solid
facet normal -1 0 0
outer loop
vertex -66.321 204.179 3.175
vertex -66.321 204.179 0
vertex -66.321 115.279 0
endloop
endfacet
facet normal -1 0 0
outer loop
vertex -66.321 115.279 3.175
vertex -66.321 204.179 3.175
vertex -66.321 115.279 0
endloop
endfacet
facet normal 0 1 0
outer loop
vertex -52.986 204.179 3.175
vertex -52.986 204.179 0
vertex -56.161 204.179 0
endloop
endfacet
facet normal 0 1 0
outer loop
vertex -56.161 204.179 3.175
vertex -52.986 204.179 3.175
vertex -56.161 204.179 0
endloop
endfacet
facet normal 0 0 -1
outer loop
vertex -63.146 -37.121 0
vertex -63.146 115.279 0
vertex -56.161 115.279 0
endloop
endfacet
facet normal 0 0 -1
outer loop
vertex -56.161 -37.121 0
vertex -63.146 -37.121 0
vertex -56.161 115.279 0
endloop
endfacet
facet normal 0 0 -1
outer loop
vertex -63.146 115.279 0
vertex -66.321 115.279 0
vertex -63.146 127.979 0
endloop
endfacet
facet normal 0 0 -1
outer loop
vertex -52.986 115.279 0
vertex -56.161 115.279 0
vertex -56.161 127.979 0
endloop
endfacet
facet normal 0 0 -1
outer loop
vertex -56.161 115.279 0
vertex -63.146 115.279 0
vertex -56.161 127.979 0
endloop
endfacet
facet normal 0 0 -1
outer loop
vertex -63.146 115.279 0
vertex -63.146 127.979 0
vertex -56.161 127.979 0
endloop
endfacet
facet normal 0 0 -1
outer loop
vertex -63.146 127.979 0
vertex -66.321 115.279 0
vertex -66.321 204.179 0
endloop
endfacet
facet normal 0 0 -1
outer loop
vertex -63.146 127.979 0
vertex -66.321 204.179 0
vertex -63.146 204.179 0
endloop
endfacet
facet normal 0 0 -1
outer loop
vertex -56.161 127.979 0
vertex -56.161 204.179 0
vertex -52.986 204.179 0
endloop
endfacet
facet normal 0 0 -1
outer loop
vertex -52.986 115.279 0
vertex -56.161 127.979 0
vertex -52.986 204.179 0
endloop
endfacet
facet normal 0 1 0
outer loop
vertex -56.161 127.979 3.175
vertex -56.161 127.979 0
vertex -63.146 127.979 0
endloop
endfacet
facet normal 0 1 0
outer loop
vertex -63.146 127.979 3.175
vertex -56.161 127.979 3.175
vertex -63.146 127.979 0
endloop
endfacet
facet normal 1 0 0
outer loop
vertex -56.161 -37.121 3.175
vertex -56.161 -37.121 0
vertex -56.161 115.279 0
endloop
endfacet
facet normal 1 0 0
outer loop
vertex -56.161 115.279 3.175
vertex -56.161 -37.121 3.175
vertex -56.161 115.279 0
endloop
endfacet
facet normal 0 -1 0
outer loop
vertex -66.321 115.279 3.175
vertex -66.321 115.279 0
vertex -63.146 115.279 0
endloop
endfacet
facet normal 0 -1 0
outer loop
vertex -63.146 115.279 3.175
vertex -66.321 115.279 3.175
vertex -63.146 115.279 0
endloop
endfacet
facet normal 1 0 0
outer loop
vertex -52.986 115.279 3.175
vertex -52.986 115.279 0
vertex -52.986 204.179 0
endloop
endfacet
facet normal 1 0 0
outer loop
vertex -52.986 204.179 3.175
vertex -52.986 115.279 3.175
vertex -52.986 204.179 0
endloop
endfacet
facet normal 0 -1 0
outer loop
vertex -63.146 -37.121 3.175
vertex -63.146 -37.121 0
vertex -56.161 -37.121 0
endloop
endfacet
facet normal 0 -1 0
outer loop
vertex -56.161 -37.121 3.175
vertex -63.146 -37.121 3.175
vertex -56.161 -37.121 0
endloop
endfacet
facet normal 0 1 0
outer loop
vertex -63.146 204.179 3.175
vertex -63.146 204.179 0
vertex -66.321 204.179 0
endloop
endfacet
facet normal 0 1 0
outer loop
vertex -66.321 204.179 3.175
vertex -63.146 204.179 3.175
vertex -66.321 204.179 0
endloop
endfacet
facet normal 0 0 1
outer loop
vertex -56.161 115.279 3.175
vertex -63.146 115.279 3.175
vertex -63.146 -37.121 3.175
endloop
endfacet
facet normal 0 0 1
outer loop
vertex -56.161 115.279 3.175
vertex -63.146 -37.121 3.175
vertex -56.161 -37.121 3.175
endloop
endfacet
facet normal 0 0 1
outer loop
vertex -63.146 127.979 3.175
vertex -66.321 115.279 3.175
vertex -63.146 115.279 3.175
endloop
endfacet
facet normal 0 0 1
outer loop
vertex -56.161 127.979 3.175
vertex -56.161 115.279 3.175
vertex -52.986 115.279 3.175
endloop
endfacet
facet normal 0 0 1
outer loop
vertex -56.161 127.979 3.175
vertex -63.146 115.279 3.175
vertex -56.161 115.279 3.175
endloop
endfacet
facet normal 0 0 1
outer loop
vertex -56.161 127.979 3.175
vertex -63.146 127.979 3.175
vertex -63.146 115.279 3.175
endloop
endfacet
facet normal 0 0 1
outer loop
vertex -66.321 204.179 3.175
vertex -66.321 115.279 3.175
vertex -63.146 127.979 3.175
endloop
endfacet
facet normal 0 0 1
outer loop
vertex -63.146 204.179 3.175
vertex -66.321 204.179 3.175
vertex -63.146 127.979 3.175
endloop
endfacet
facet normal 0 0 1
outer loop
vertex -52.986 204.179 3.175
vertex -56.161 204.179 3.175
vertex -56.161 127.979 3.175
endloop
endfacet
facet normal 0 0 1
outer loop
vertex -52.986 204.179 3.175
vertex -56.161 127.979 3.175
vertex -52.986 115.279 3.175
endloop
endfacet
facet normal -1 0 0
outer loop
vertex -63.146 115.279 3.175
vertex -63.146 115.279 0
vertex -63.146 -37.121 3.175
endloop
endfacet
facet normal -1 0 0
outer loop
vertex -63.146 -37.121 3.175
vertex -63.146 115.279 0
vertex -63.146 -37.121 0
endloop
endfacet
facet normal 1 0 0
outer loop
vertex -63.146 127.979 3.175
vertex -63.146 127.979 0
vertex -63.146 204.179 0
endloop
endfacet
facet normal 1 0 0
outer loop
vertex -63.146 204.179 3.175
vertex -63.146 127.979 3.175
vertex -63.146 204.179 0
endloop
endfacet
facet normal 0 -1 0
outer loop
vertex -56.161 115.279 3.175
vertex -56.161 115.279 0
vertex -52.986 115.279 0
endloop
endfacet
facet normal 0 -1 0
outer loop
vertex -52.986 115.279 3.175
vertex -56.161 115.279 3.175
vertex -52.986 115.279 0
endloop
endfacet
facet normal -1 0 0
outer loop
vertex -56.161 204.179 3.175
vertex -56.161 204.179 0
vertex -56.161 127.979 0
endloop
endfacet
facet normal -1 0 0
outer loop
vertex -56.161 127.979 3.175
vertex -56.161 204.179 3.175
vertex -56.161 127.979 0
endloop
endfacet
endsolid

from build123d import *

# Parameters (mm, degrees)
F1_DEPTH = 3.175


with BuildPart() as f1:
    # F0 (on Top) → F1 (new body)
    with BuildSketch(Plane.XY):
        Polygon((-63.146477, 115.279474), (-63.146477, 127.979474), (-63.146477, 204.179474), (-66.321477, 204.179474), (-66.321477, 115.279474), align=None)
        Polygon((-56.161477, 204.179474), (-56.161477, 127.979474), (-56.161477, 115.279474), (-52.986477, 115.279474), (-52.986477, 204.179474), align=None)
        Polygon((-56.161477, 127.979474), (-63.146477, 127.979474), (-63.146477, 115.279474), (-63.146477, -37.120526), (-56.161477, -37.120526), (-56.161477, 115.279474), align=None)
    extrude(amount=F1_DEPTH)


solid = f1.part
